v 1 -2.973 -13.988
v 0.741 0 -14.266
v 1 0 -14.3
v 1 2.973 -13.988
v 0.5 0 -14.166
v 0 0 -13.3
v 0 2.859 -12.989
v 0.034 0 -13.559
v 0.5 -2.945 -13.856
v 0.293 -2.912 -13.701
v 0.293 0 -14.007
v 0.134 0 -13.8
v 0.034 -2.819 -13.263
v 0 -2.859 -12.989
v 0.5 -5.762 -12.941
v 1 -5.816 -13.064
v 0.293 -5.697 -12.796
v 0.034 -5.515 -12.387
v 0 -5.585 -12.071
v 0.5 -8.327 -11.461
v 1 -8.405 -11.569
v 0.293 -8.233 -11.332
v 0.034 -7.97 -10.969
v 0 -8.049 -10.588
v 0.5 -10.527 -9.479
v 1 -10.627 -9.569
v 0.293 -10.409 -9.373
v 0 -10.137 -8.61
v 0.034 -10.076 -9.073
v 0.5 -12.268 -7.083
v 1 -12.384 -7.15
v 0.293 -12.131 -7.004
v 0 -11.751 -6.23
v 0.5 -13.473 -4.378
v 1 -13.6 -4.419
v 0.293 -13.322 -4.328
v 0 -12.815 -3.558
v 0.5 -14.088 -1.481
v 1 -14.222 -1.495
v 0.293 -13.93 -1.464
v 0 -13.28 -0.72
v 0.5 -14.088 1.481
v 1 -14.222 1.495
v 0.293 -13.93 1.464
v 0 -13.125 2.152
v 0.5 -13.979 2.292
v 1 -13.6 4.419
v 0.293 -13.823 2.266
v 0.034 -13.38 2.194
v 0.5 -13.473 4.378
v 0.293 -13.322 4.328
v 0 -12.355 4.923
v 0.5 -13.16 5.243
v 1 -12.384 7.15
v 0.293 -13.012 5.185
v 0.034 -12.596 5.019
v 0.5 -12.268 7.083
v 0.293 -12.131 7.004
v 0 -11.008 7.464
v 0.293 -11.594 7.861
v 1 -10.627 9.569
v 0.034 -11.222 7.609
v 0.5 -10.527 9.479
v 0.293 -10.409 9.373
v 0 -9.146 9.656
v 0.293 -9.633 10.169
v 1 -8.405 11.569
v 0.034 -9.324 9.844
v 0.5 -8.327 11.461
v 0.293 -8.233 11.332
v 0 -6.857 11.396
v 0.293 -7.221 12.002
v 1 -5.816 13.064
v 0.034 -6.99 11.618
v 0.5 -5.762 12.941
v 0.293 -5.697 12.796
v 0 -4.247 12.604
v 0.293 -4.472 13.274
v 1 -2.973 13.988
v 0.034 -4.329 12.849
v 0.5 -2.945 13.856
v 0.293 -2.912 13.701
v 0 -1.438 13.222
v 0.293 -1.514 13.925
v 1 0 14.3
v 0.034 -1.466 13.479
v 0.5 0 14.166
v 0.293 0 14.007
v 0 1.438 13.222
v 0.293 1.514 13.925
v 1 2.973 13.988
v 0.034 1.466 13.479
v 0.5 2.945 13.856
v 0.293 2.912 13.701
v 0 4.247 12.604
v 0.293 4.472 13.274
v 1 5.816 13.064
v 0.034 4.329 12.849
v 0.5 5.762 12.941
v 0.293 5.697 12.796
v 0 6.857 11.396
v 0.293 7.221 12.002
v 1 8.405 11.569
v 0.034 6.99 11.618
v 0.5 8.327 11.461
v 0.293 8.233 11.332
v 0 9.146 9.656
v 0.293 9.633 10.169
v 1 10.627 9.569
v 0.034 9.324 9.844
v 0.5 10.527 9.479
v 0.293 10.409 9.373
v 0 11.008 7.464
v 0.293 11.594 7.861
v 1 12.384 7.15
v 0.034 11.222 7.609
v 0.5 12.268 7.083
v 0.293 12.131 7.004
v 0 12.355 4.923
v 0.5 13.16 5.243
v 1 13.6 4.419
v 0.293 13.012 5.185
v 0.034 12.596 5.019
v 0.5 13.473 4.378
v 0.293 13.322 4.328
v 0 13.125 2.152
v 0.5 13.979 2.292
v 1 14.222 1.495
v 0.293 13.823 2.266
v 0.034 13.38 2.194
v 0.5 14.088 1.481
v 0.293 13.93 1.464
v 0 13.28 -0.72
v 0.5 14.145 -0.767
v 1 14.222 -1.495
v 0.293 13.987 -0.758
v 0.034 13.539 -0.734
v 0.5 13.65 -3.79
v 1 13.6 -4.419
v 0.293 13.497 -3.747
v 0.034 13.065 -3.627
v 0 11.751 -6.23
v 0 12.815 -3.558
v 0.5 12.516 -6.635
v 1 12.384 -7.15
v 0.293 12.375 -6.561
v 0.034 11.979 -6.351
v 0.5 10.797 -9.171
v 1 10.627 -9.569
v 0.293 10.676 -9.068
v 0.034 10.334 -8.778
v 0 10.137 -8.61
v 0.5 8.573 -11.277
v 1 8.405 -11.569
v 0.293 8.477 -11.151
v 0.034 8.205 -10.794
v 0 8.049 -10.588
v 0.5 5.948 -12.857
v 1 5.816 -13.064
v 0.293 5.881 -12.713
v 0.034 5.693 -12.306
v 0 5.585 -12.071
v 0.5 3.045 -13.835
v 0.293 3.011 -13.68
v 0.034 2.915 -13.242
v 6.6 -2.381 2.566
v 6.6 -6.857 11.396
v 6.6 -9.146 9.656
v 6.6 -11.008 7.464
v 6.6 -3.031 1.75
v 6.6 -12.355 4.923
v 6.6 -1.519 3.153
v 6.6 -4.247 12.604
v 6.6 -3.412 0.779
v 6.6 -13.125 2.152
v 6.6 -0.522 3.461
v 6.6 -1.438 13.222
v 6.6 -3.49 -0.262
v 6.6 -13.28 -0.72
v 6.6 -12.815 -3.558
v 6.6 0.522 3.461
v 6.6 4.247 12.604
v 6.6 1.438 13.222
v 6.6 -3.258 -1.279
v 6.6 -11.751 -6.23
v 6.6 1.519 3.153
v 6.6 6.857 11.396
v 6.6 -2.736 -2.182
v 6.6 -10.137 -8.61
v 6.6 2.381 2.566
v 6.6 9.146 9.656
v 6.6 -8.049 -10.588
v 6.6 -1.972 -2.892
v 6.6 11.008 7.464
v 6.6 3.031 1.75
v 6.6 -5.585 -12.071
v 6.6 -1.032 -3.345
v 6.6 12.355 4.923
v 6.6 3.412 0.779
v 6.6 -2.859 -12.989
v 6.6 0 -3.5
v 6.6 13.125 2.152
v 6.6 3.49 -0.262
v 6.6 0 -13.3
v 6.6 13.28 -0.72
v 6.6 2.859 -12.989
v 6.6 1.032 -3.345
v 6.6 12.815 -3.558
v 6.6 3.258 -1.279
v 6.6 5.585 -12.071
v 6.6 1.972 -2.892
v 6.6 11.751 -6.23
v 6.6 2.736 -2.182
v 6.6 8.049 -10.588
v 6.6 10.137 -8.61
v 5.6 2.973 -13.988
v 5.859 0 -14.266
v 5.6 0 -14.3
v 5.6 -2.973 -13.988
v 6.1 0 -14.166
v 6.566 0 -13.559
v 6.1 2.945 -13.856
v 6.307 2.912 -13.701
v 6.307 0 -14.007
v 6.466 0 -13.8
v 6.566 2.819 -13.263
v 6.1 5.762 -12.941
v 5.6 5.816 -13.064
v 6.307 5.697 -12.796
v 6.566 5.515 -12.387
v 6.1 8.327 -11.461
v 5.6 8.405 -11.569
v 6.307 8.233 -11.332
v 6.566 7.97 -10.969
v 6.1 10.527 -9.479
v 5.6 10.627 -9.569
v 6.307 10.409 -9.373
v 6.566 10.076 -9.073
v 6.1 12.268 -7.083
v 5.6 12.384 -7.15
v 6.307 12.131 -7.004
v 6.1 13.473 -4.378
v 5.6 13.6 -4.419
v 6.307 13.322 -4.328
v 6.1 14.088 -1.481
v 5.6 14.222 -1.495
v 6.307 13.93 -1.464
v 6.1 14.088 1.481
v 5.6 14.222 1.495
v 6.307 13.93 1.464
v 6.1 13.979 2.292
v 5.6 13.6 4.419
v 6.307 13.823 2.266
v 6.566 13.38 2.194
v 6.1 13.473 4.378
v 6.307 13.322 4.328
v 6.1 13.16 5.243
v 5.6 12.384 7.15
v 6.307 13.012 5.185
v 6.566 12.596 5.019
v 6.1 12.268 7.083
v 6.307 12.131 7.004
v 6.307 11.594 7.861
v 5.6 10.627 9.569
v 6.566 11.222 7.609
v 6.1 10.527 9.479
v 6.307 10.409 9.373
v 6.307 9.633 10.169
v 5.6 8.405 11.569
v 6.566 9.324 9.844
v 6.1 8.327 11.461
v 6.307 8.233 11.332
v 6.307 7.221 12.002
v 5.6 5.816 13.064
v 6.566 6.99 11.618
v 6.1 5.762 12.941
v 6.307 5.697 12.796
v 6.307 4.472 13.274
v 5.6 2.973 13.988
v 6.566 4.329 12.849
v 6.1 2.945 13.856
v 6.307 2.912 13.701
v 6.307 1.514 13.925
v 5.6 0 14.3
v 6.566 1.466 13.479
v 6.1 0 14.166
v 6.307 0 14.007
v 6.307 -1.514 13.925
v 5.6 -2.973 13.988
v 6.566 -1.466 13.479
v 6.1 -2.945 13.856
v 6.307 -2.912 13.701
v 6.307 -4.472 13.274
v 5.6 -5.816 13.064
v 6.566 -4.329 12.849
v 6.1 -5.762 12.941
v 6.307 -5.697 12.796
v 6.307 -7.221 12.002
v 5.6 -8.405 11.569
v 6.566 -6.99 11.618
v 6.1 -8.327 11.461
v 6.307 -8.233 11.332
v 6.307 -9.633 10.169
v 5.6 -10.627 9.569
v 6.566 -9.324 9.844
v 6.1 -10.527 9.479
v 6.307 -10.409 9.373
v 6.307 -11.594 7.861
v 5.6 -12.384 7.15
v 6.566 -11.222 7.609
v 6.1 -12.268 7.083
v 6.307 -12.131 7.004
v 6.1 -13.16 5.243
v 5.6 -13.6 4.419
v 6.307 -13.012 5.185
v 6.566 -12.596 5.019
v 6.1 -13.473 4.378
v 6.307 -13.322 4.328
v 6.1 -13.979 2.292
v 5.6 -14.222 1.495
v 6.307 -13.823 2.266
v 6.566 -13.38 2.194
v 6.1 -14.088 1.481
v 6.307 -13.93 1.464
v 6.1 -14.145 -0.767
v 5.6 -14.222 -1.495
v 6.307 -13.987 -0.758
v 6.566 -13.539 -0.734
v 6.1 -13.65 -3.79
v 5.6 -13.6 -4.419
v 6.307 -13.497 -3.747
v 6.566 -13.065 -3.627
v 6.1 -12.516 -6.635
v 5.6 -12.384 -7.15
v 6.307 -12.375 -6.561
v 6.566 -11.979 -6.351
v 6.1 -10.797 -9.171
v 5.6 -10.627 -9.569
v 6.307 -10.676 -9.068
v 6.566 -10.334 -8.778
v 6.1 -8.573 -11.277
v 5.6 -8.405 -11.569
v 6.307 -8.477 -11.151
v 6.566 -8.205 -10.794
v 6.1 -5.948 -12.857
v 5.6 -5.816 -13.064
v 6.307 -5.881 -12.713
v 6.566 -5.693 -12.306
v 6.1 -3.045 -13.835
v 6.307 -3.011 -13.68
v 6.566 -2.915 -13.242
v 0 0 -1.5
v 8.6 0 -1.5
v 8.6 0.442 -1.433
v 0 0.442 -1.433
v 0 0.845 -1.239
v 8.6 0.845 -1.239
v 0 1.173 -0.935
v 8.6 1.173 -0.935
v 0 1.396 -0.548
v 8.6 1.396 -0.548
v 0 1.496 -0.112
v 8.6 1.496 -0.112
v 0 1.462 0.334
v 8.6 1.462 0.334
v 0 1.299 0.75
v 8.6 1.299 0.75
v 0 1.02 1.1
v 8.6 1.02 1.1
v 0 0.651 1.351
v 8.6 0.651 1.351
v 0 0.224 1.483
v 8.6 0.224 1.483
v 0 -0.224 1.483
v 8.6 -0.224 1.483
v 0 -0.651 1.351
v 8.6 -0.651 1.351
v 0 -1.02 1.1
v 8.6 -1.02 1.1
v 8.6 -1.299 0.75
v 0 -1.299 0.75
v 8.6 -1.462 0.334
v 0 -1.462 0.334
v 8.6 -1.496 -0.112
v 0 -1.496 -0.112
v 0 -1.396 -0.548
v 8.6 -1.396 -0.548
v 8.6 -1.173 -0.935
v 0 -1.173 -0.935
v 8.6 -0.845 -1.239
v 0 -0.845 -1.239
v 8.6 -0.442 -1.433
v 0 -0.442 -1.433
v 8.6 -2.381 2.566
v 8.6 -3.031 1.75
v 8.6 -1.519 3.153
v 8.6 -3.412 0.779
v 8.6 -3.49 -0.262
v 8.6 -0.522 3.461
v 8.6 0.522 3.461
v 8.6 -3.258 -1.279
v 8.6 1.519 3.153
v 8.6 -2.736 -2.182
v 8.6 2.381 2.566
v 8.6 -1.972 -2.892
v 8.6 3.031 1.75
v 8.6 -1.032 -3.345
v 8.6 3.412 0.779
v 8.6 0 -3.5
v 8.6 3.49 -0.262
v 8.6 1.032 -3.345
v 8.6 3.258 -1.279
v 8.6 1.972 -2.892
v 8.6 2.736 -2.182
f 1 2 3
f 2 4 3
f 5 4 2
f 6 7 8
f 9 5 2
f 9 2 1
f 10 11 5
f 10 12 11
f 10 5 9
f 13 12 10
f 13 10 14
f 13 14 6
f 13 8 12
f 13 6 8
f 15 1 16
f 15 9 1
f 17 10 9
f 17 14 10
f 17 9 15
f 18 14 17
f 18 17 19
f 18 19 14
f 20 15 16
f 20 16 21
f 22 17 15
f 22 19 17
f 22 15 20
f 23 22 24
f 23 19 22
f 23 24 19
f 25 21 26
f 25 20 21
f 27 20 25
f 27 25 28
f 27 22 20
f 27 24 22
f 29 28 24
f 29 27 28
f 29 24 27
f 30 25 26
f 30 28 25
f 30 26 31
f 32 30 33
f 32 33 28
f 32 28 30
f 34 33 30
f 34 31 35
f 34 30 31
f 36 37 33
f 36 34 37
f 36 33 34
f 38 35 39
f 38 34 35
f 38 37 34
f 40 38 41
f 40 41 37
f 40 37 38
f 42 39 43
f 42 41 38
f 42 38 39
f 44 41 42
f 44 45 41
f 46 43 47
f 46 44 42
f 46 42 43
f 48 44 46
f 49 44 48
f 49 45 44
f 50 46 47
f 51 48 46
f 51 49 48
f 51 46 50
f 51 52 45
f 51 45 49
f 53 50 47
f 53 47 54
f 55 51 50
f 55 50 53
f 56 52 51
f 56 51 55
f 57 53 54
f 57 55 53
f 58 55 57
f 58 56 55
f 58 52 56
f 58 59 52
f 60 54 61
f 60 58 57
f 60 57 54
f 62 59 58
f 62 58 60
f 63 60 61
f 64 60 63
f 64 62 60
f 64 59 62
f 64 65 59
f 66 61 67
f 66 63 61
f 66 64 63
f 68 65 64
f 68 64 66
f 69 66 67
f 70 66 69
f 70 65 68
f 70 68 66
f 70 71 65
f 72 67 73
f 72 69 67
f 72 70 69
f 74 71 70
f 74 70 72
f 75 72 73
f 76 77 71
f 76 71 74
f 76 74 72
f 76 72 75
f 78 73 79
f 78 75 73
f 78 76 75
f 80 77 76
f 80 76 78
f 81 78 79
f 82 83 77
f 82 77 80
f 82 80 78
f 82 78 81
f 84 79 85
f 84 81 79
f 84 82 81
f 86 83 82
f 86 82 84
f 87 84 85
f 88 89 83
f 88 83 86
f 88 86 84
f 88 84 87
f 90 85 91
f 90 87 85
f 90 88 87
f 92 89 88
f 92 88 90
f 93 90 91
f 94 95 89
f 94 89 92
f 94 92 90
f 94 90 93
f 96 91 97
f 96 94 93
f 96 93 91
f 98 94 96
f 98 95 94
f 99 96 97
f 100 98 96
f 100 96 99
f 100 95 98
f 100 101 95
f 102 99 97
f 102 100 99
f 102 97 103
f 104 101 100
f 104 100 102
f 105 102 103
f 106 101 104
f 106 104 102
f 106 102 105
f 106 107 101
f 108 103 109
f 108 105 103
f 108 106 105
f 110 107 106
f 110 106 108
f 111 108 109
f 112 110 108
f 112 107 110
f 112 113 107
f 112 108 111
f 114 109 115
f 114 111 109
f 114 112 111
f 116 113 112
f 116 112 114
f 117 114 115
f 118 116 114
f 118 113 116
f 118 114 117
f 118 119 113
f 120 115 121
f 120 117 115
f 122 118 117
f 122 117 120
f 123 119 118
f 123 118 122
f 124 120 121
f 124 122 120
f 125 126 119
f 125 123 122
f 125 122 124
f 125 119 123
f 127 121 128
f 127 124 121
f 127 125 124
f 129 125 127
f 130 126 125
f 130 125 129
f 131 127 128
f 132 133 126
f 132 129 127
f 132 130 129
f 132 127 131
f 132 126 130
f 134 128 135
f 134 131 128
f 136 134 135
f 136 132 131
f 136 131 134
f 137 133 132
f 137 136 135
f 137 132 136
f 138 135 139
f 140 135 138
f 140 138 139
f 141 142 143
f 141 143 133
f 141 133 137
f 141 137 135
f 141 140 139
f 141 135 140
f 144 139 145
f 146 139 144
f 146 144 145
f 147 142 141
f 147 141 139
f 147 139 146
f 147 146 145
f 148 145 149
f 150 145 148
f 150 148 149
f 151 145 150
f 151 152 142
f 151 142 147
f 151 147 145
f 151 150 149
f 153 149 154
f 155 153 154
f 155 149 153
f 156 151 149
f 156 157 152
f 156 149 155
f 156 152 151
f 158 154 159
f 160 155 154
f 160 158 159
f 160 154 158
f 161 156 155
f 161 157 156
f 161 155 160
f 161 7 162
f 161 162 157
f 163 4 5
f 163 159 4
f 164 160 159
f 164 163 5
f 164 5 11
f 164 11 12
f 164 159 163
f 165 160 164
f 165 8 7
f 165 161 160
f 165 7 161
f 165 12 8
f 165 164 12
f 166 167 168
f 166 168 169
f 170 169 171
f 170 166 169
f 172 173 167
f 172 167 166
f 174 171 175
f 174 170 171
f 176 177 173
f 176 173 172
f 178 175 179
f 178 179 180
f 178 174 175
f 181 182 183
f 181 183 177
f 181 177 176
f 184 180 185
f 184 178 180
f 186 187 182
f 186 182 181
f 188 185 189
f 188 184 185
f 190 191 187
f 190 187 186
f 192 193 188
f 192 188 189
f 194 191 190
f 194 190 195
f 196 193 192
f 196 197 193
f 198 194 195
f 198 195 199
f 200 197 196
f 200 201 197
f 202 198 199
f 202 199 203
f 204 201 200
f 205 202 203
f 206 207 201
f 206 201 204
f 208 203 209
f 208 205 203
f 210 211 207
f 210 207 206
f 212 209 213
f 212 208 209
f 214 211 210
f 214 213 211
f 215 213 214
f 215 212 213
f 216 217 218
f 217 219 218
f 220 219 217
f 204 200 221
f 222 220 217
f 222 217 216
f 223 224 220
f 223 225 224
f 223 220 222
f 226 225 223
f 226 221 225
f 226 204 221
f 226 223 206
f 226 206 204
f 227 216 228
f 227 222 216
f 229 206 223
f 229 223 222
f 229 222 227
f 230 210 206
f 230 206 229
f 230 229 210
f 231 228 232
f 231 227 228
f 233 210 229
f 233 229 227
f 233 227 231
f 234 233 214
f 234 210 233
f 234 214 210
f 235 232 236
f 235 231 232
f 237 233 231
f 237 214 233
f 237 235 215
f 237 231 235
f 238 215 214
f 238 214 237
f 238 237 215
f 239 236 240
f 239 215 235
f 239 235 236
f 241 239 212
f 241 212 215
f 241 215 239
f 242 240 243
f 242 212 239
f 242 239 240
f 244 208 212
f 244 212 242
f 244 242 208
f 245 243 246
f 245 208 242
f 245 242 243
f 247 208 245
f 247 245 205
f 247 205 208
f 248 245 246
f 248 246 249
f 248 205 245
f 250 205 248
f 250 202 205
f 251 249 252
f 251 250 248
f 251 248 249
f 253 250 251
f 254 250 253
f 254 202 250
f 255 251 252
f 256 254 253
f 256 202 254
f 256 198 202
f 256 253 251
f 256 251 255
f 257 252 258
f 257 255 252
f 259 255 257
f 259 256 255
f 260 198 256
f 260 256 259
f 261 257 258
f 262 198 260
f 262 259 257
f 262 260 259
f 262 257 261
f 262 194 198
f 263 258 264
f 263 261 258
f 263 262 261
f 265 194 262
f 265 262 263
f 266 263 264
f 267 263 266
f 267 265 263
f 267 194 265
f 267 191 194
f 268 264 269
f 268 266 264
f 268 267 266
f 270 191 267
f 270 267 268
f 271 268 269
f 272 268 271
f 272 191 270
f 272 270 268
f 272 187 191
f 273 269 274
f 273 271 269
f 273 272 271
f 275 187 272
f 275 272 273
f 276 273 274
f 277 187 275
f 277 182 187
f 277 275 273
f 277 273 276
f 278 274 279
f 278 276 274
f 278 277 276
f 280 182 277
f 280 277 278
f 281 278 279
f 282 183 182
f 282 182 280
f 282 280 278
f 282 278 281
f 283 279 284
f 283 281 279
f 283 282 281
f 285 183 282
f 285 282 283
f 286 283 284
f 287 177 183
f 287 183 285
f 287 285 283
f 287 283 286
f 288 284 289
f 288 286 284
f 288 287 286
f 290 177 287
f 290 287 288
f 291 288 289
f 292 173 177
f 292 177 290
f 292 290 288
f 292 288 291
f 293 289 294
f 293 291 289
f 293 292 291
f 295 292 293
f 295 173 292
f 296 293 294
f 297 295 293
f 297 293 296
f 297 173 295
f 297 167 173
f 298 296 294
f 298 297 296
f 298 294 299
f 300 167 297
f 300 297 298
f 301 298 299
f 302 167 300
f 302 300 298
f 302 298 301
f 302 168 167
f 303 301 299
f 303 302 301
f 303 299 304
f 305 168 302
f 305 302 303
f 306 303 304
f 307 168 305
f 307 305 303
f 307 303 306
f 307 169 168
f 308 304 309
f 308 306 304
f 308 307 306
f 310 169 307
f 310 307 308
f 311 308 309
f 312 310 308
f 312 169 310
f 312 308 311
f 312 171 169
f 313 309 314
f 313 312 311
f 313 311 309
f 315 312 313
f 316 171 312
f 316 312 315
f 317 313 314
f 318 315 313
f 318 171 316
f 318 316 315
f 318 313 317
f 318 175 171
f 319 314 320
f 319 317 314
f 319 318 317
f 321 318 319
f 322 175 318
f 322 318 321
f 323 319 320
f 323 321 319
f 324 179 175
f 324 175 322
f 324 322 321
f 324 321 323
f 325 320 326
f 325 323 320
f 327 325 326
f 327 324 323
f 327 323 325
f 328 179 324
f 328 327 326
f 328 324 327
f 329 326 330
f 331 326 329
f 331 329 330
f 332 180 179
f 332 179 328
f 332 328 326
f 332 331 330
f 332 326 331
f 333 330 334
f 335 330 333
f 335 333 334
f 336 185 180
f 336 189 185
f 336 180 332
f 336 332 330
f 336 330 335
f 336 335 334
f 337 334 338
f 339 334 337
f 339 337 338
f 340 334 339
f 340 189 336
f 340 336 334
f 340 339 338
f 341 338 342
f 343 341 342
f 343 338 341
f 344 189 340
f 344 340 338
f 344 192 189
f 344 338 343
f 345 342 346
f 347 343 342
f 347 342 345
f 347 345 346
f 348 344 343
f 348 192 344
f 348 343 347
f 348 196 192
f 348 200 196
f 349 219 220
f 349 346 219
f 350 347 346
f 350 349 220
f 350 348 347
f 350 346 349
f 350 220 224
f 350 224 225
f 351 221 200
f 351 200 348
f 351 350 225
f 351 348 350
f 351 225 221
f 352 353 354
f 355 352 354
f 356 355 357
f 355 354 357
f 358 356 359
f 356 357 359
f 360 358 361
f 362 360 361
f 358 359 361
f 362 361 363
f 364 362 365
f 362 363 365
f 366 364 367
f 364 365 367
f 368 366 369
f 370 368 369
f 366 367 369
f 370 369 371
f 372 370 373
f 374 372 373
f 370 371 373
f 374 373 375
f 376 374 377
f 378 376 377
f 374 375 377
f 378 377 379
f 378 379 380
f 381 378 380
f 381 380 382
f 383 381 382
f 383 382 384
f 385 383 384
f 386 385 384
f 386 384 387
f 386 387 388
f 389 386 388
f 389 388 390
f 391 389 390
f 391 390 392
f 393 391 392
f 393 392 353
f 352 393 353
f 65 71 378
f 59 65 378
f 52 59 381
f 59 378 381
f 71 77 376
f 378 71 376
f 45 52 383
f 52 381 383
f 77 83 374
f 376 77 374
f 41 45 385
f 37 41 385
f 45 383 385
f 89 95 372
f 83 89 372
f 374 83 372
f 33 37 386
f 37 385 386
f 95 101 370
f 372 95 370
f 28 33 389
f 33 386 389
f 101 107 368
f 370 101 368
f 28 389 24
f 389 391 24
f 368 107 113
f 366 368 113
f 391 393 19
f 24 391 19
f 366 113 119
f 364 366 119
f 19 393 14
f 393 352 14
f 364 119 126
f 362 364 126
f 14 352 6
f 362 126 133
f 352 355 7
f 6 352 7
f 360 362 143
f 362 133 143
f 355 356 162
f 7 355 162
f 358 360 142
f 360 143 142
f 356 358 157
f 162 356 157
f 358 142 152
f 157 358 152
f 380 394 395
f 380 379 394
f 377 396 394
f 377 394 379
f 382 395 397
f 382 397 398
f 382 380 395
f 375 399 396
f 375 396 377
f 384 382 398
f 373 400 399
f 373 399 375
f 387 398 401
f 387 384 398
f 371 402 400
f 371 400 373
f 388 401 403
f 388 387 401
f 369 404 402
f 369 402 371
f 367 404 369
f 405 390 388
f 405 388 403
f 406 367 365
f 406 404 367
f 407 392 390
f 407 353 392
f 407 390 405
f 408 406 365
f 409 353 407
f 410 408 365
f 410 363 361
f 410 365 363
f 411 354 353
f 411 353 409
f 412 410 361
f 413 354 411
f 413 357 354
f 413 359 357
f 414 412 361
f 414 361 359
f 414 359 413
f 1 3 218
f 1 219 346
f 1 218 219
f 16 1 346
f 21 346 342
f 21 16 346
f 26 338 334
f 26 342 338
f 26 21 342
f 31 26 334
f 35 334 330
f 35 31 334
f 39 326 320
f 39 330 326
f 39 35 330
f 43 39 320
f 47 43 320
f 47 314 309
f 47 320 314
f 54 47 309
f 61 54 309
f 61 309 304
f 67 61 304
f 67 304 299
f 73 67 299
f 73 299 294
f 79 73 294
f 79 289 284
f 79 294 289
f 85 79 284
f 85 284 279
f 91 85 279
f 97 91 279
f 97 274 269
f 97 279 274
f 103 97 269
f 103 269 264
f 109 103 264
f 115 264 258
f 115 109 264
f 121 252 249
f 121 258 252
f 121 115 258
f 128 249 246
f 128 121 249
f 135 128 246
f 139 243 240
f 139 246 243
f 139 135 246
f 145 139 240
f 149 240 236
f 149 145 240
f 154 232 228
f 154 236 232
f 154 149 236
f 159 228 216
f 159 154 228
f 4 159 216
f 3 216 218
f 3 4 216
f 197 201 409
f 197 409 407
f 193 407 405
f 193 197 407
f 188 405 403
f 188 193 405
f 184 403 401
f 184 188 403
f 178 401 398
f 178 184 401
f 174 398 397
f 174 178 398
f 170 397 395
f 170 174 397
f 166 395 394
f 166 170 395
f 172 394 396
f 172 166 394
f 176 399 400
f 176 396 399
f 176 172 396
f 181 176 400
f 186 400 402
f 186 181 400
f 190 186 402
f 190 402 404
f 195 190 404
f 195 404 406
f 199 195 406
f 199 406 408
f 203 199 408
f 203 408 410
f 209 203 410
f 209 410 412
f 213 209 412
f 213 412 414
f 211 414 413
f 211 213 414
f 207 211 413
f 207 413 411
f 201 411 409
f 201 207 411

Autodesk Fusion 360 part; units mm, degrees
sketch "スケッチ1" plane through (0, 0, 0) normal (1, 0, 0) x (0, 0, -1)
  circle A0 centre (0, 0) radius 14.3
  dimension "d1" = 28.6
extrude "押し出し1" add sketch "スケッチ1" along normal blind 6.6
sketch "スケッチ2" plane through (6.6, 0, 0) normal (1, 0, 0) x (0, 0, -1)
  circle A0 centre (0, 0) radius 14.3
  circle A1 centre (0, 0) radius 3.5
  dimension "d4" = 7
extrude "押し出し2" add sketch "スケッチ2" along normal blind 2 contours A1
sketch "スケッチ3" plane through (8.6, 0, 0) normal (1, 0, 0) x (0, 0, -1)
  circle A0 centre (0, 0) radius 3.5
  circle A1 centre (0, 0) radius 1.5
  dimension "d7" = 3
extrude "押し出し3" cut sketch "スケッチ3" along normal mid plane 17.6 contours A1
fillet "フィレット1" radius 1 1 edges at (0, -5.1711, 13.3323)
fillet "フィレット2" radius 1 1 edges at (6.6, -5.1711, 13.3323)
